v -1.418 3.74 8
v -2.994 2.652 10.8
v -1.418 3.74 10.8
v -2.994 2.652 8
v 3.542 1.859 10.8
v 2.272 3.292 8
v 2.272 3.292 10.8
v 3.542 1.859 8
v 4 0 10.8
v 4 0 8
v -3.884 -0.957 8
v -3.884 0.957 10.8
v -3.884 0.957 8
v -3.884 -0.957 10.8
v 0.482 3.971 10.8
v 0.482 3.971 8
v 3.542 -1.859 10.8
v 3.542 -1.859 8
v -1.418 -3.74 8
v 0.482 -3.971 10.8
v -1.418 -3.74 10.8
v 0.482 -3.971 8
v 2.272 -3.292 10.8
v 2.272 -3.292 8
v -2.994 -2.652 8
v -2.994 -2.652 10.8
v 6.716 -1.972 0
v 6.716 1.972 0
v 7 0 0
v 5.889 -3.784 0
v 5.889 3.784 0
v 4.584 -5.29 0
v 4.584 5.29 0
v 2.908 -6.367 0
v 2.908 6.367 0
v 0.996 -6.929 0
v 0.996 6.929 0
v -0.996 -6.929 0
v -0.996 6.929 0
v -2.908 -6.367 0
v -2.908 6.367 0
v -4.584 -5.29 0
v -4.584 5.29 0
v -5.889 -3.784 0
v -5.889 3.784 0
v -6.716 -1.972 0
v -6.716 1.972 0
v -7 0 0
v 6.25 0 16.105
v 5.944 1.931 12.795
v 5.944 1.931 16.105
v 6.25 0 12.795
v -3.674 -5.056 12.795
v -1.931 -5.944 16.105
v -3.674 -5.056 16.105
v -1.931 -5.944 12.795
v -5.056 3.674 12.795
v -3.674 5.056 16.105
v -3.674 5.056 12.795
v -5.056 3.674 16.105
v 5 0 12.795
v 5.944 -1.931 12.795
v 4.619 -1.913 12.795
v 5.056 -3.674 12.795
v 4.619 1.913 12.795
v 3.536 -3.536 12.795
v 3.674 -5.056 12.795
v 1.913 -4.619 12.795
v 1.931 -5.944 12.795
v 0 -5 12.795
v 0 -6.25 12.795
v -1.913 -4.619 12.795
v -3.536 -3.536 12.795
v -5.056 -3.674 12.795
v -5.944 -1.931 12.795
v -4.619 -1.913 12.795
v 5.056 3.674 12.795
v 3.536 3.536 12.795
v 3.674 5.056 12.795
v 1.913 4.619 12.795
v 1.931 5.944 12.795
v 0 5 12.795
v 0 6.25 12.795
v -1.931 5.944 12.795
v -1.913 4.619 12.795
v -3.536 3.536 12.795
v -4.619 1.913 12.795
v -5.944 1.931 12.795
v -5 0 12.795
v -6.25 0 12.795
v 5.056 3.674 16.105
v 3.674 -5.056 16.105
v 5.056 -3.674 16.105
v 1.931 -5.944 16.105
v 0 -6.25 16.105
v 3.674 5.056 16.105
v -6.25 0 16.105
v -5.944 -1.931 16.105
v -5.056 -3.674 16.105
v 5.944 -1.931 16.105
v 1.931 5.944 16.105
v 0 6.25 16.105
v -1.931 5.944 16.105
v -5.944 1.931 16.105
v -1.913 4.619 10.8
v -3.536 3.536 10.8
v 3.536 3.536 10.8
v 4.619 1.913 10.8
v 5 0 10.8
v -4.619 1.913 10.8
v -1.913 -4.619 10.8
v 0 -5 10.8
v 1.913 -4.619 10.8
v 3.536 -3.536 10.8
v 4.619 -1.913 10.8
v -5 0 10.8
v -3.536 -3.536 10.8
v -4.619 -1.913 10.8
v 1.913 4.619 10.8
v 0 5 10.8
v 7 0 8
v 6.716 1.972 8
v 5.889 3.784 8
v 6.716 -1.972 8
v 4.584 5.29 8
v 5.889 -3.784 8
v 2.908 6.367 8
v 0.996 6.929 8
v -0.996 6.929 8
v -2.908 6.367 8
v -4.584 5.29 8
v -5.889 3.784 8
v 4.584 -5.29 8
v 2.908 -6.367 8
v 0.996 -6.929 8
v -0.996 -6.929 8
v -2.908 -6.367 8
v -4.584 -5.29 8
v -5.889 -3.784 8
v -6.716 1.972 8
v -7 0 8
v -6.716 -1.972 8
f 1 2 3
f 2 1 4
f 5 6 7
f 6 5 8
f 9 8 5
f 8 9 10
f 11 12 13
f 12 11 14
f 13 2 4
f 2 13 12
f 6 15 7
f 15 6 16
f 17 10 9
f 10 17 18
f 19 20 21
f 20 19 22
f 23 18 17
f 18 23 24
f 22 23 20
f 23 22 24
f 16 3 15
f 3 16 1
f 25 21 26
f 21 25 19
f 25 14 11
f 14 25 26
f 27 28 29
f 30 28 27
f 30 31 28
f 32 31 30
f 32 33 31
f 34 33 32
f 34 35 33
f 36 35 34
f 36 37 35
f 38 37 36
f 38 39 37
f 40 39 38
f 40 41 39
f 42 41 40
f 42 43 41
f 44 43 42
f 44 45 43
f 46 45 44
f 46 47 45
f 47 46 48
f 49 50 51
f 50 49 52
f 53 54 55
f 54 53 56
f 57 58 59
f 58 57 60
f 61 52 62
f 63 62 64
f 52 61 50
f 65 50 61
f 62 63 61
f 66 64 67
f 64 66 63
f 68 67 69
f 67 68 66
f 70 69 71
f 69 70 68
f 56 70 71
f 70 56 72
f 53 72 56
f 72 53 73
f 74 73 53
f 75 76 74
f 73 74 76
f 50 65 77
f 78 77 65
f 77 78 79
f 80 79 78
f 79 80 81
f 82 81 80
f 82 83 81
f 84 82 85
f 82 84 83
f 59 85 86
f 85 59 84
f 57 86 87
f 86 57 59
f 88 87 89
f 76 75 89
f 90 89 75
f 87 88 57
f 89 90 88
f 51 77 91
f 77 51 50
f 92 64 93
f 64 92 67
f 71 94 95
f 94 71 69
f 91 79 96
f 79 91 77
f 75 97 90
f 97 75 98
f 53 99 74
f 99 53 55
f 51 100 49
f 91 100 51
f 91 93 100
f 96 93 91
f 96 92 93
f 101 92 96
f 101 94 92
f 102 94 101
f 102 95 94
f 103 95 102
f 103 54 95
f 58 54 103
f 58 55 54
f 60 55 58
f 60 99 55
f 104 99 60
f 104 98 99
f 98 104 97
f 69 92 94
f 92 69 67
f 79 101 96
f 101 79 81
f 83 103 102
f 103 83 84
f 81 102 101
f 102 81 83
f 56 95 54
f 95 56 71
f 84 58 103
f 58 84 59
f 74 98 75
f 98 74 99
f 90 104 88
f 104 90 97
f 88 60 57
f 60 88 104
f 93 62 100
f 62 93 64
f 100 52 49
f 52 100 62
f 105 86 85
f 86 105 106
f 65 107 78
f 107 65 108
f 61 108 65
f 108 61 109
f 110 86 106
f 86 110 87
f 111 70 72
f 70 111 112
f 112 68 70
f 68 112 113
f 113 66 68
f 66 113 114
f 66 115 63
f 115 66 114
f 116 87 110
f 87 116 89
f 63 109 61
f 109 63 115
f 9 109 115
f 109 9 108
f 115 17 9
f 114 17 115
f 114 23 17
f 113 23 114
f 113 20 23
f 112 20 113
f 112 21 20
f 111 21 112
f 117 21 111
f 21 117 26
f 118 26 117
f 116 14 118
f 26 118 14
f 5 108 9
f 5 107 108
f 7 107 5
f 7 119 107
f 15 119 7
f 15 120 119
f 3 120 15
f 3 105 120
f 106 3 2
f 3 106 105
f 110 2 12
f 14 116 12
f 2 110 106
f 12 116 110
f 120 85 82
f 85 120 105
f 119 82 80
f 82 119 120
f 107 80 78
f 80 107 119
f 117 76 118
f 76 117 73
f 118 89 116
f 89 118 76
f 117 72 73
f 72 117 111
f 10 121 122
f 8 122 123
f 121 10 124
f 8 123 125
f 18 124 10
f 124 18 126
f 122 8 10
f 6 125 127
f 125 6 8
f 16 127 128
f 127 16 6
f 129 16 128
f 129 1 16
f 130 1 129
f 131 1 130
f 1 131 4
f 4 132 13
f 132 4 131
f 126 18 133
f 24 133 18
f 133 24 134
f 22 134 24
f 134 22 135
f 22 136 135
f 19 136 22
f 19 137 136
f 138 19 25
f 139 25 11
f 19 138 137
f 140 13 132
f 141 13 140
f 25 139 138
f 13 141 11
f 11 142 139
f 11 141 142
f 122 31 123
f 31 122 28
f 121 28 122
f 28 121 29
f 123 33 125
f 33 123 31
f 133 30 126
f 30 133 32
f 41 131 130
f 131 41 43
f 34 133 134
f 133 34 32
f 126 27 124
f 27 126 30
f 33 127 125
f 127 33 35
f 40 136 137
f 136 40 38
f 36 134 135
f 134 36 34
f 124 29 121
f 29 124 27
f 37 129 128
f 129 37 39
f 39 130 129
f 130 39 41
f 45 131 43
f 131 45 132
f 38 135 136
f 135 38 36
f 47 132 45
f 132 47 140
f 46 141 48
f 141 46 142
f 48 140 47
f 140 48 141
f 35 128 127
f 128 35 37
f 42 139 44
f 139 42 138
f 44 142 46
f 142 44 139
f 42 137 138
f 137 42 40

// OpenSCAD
module 8mm_panelmount_button(){
    // button shaft
    translate([0,0,12.8/2])
        cylinder(h=12.8,d=8, center=true);
    
    // button cap
    translate([0,0,12.8+(3.3/2)])
        cylinder(h=3.3+0.01,d=12.5, center=true);
    
    // Rubber gasket
    color("green")
        translate([0,0,12.8-1])
            cylinder(h=2,d=10, center=true);
    
    // retaining hex nut
    color("red")
        translate([0,0,7])
            cylinder(h=2,d=12, center=true, $fn=6);
    
    // Clearance for socket - 14mm
    color("lightblue",0.33)
        translate([0,0,4])
            cylinder(h=8,d=14, center=true);
}

8mm_panelmount_button();
